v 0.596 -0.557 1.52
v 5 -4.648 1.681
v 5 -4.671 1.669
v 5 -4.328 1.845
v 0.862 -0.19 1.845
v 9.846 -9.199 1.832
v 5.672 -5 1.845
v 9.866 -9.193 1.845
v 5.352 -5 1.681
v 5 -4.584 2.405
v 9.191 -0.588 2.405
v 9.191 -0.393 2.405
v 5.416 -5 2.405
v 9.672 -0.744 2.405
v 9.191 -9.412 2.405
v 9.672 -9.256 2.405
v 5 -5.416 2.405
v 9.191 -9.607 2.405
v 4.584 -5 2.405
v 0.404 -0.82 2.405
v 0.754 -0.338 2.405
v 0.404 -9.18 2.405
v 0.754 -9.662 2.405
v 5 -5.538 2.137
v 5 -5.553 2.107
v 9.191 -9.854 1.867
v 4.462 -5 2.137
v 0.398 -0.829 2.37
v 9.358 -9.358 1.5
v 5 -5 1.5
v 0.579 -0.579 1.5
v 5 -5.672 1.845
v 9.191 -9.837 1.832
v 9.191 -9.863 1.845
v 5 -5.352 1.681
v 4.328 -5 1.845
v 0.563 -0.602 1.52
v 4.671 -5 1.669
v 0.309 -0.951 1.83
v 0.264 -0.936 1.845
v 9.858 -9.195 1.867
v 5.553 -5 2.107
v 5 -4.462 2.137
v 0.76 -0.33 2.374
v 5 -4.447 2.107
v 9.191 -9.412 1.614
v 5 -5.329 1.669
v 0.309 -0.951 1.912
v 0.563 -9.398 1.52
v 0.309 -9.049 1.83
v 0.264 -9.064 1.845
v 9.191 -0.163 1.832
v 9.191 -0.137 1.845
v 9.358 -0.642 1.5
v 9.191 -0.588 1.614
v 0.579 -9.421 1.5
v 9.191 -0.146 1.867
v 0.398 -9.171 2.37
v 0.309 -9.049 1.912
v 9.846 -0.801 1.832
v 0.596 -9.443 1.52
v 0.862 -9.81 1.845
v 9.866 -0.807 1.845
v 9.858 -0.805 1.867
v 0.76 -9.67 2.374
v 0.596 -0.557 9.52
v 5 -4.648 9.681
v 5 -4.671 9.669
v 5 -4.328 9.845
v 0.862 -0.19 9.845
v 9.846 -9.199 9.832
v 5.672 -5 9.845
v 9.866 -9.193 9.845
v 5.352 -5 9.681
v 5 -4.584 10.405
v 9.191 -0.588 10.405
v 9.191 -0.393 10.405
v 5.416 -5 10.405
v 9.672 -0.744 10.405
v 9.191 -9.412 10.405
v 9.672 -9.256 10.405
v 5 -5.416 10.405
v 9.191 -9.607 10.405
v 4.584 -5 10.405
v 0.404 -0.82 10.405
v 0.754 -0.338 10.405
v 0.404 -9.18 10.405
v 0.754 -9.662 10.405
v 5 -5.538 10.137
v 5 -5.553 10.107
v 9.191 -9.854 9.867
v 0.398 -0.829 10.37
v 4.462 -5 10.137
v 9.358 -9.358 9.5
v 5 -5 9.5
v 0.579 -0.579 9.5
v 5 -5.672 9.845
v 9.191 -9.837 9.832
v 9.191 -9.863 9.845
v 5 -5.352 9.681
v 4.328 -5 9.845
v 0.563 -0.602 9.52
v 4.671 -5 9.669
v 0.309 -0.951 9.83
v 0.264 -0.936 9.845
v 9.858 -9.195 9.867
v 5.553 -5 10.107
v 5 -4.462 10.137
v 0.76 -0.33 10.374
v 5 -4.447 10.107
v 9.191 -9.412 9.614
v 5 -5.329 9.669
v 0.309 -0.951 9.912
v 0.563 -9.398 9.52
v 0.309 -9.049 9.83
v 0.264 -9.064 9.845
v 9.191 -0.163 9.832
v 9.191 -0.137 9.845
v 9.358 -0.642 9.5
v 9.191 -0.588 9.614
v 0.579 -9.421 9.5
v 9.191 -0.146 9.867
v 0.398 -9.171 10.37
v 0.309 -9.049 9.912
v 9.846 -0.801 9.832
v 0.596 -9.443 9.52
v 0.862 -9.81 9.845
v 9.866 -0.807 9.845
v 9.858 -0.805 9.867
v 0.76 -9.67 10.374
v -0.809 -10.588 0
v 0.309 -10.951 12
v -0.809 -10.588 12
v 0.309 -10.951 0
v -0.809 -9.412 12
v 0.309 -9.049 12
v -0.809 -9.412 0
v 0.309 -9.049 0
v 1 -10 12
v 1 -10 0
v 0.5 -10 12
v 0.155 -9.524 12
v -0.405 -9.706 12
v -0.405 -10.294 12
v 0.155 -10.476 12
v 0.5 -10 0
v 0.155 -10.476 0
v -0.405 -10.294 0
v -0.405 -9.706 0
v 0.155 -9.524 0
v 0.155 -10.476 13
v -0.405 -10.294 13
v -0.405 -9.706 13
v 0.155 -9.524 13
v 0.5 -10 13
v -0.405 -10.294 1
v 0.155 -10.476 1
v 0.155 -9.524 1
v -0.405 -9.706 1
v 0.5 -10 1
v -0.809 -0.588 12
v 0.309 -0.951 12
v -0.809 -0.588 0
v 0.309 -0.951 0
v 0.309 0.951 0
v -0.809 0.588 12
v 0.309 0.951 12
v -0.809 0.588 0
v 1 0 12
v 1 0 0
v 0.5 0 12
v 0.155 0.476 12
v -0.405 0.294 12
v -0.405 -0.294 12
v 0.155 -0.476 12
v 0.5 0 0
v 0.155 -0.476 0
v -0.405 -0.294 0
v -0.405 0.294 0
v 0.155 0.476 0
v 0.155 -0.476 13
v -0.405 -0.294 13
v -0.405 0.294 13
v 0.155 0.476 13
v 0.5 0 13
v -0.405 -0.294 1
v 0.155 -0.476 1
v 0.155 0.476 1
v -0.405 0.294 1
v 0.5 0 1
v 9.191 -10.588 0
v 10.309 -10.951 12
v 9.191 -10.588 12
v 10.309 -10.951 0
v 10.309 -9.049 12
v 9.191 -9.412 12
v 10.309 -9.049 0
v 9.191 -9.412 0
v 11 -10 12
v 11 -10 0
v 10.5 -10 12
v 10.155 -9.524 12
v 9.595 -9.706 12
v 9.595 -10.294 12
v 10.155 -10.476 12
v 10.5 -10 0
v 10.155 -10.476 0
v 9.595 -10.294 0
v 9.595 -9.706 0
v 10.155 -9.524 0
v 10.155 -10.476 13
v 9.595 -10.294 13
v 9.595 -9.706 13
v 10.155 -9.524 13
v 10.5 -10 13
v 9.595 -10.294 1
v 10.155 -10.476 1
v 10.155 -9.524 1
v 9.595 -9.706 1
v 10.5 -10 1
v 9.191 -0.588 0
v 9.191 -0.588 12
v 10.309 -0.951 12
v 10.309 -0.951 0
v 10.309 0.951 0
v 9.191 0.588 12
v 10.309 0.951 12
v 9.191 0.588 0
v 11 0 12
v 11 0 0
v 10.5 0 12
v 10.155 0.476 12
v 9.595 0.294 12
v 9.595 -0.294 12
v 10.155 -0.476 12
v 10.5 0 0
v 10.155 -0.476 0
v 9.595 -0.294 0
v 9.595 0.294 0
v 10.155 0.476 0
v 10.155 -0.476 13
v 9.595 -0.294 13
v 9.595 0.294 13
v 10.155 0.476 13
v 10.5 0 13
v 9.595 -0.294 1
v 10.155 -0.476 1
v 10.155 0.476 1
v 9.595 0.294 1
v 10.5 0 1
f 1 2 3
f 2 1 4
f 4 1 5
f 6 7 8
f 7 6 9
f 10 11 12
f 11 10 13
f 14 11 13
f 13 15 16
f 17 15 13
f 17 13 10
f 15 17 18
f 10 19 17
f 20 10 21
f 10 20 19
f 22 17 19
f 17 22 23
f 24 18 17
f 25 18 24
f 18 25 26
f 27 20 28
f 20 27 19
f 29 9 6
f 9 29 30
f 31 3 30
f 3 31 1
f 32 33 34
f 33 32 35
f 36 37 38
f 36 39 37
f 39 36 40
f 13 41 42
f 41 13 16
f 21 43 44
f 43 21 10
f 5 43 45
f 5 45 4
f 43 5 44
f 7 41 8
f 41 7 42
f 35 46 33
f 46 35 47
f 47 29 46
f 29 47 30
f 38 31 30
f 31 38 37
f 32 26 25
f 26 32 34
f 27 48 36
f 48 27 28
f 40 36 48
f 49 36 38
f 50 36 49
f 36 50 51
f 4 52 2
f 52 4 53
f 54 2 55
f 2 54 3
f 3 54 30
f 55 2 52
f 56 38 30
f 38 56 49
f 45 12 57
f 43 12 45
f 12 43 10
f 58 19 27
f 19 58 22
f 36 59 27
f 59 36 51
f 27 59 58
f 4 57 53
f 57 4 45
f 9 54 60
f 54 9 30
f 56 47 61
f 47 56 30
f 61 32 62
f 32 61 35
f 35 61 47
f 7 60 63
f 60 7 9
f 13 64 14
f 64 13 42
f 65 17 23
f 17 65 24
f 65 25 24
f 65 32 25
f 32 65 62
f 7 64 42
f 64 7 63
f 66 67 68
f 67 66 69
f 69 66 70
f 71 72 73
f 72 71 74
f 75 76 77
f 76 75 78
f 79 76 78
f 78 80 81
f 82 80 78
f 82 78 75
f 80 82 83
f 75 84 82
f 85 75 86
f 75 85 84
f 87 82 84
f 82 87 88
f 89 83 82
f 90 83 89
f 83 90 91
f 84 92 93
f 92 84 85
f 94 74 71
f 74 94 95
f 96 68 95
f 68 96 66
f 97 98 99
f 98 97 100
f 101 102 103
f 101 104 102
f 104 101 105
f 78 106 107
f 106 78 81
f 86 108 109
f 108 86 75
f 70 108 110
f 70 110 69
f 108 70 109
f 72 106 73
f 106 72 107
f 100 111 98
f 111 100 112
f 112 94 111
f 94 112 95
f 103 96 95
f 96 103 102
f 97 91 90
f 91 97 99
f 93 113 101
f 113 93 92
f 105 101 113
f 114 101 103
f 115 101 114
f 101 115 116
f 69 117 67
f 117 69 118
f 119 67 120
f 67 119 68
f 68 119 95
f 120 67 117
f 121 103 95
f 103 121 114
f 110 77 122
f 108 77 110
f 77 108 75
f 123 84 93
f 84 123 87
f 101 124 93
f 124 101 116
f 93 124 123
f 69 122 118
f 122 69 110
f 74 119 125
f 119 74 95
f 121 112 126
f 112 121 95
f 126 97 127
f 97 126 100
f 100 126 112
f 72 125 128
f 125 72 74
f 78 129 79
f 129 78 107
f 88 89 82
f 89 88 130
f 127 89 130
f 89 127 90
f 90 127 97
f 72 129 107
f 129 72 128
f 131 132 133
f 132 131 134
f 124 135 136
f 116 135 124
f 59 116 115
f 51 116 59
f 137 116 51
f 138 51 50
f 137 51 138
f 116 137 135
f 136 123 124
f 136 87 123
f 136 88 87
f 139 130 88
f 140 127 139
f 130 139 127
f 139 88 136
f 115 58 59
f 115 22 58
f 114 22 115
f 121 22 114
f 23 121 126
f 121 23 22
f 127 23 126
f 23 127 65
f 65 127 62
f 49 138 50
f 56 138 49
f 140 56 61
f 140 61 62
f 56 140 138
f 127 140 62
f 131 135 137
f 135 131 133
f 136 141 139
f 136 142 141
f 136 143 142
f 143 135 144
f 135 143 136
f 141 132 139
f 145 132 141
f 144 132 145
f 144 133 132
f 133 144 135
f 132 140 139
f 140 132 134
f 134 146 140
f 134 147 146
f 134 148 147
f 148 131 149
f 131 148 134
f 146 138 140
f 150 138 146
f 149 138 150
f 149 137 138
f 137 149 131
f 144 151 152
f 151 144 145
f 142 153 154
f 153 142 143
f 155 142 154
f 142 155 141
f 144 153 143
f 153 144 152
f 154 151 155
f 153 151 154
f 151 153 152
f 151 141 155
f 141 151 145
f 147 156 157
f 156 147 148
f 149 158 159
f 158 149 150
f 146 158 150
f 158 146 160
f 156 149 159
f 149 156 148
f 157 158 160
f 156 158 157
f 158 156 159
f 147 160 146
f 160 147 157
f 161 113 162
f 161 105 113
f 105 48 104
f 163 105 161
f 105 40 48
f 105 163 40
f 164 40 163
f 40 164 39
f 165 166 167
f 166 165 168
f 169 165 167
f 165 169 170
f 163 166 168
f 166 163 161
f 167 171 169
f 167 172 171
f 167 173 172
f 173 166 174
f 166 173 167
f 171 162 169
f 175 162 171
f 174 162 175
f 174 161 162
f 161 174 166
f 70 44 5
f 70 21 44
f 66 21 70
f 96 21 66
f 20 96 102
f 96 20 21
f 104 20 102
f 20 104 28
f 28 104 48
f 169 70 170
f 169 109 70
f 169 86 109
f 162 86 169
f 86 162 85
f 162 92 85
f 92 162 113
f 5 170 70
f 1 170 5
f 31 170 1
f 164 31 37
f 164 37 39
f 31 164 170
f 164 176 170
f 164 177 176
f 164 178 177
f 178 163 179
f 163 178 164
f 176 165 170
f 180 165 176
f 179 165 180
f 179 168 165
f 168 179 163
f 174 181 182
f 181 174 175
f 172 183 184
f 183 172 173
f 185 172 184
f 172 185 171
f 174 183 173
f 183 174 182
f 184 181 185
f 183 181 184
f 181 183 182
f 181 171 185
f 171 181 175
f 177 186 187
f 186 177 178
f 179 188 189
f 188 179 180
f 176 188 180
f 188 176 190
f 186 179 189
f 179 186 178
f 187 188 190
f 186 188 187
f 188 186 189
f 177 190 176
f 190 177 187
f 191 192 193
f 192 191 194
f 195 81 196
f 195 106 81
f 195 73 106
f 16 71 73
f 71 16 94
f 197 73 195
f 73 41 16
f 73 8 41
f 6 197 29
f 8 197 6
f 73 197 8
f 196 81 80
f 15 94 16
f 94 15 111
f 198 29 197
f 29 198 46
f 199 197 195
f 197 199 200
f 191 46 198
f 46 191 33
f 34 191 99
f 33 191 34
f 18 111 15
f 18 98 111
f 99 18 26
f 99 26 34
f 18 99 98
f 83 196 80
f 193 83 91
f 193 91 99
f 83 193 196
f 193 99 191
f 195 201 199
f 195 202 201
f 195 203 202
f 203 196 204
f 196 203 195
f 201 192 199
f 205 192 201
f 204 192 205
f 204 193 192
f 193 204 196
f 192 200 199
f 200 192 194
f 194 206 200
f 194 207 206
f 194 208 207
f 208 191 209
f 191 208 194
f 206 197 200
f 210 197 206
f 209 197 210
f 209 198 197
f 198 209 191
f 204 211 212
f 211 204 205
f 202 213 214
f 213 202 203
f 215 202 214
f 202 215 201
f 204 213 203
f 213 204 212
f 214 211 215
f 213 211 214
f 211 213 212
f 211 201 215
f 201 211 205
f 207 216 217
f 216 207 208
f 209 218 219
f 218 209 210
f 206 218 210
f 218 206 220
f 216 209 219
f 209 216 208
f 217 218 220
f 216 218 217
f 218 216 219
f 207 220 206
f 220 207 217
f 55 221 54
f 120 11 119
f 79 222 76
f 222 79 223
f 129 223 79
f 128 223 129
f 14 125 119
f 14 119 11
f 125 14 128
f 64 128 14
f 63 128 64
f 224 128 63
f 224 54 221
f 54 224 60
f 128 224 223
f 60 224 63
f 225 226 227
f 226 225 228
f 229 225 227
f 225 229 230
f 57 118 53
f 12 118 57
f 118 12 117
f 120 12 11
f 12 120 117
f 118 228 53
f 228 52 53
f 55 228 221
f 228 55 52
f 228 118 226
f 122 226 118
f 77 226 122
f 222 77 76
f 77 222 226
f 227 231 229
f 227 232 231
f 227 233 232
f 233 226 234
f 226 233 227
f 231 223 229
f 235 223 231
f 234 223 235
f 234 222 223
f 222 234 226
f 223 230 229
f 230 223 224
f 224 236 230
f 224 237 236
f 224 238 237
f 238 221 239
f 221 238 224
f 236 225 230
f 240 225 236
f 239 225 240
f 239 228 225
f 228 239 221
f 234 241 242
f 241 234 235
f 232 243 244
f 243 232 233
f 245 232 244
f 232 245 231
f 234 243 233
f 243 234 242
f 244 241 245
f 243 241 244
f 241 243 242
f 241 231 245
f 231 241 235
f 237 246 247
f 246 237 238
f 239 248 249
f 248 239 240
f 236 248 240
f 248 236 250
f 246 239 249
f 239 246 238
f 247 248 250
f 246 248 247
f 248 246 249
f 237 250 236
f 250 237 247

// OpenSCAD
union() {
	translate(v = [0, 0, 2]) {
		union() {
			rotate(a = [0, 90, -45]) {
				cylinder(h = 14, r = 0.5);
			}
			translate(v = [0, -10, 0]) {
				rotate(a = [0, 90, 45]) {
					cylinder(h = 14, r = 0.5);
				}
			}
		}
	}
	translate(v = [0, 0, 10]) {
		union() {
			rotate(a = [0, 90, -45]) {
				cylinder(h = 14, r = 0.5);
			}
			translate(v = [0, -10, 0]) {
				rotate(a = [0, 90, 45]) {
					cylinder(h = 14, r = 0.5);
				}
			}
		}
	}
	translate(v = [0, -10, 0]) {
		union() {
			difference() {
				union() {
					cylinder(h = 12, r = 1);
					translate(v = [0, 0, 12]) {
						cylinder(h = 1, r = 0.5);
					}
				}
				translate(v = [0, 0, -0.1]) {
					cylinder(h = 1.1, r = 0.5);
				}
			}
			translate(v = [0, 10, 0]) {
				difference() {
					union() {
						cylinder(h = 12, r = 1);
						translate(v = [0, 0, 12]) {
							cylinder(h = 1, r = 0.5);
						}
					}
					translate(v = [0, 0, -0.1]) {
						cylinder(h = 1.1, r = 0.5);
					}
				}
			}
			translate(v = [10, 0, 0]) {
				difference() {
					union() {
						cylinder(h = 12, r = 1);
						translate(v = [0, 0, 12]) {
							cylinder(h = 1, r = 0.5);
						}
					}
					translate(v = [0, 0, -0.1]) {
						cylinder(h = 1.1, r = 0.5);
					}
				}
			}
			translate(v = [10, 10, 0]) {
				difference() {
					union() {
						cylinder(h = 12, r = 1);
						translate(v = [0, 0, 12]) {
							cylinder(h = 1, r = 0.5);
						}
					}
					translate(v = [0, 0, -0.1]) {
						cylinder(h = 1.1, r = 0.5);
					}
				}
			}
		}
	}
}
